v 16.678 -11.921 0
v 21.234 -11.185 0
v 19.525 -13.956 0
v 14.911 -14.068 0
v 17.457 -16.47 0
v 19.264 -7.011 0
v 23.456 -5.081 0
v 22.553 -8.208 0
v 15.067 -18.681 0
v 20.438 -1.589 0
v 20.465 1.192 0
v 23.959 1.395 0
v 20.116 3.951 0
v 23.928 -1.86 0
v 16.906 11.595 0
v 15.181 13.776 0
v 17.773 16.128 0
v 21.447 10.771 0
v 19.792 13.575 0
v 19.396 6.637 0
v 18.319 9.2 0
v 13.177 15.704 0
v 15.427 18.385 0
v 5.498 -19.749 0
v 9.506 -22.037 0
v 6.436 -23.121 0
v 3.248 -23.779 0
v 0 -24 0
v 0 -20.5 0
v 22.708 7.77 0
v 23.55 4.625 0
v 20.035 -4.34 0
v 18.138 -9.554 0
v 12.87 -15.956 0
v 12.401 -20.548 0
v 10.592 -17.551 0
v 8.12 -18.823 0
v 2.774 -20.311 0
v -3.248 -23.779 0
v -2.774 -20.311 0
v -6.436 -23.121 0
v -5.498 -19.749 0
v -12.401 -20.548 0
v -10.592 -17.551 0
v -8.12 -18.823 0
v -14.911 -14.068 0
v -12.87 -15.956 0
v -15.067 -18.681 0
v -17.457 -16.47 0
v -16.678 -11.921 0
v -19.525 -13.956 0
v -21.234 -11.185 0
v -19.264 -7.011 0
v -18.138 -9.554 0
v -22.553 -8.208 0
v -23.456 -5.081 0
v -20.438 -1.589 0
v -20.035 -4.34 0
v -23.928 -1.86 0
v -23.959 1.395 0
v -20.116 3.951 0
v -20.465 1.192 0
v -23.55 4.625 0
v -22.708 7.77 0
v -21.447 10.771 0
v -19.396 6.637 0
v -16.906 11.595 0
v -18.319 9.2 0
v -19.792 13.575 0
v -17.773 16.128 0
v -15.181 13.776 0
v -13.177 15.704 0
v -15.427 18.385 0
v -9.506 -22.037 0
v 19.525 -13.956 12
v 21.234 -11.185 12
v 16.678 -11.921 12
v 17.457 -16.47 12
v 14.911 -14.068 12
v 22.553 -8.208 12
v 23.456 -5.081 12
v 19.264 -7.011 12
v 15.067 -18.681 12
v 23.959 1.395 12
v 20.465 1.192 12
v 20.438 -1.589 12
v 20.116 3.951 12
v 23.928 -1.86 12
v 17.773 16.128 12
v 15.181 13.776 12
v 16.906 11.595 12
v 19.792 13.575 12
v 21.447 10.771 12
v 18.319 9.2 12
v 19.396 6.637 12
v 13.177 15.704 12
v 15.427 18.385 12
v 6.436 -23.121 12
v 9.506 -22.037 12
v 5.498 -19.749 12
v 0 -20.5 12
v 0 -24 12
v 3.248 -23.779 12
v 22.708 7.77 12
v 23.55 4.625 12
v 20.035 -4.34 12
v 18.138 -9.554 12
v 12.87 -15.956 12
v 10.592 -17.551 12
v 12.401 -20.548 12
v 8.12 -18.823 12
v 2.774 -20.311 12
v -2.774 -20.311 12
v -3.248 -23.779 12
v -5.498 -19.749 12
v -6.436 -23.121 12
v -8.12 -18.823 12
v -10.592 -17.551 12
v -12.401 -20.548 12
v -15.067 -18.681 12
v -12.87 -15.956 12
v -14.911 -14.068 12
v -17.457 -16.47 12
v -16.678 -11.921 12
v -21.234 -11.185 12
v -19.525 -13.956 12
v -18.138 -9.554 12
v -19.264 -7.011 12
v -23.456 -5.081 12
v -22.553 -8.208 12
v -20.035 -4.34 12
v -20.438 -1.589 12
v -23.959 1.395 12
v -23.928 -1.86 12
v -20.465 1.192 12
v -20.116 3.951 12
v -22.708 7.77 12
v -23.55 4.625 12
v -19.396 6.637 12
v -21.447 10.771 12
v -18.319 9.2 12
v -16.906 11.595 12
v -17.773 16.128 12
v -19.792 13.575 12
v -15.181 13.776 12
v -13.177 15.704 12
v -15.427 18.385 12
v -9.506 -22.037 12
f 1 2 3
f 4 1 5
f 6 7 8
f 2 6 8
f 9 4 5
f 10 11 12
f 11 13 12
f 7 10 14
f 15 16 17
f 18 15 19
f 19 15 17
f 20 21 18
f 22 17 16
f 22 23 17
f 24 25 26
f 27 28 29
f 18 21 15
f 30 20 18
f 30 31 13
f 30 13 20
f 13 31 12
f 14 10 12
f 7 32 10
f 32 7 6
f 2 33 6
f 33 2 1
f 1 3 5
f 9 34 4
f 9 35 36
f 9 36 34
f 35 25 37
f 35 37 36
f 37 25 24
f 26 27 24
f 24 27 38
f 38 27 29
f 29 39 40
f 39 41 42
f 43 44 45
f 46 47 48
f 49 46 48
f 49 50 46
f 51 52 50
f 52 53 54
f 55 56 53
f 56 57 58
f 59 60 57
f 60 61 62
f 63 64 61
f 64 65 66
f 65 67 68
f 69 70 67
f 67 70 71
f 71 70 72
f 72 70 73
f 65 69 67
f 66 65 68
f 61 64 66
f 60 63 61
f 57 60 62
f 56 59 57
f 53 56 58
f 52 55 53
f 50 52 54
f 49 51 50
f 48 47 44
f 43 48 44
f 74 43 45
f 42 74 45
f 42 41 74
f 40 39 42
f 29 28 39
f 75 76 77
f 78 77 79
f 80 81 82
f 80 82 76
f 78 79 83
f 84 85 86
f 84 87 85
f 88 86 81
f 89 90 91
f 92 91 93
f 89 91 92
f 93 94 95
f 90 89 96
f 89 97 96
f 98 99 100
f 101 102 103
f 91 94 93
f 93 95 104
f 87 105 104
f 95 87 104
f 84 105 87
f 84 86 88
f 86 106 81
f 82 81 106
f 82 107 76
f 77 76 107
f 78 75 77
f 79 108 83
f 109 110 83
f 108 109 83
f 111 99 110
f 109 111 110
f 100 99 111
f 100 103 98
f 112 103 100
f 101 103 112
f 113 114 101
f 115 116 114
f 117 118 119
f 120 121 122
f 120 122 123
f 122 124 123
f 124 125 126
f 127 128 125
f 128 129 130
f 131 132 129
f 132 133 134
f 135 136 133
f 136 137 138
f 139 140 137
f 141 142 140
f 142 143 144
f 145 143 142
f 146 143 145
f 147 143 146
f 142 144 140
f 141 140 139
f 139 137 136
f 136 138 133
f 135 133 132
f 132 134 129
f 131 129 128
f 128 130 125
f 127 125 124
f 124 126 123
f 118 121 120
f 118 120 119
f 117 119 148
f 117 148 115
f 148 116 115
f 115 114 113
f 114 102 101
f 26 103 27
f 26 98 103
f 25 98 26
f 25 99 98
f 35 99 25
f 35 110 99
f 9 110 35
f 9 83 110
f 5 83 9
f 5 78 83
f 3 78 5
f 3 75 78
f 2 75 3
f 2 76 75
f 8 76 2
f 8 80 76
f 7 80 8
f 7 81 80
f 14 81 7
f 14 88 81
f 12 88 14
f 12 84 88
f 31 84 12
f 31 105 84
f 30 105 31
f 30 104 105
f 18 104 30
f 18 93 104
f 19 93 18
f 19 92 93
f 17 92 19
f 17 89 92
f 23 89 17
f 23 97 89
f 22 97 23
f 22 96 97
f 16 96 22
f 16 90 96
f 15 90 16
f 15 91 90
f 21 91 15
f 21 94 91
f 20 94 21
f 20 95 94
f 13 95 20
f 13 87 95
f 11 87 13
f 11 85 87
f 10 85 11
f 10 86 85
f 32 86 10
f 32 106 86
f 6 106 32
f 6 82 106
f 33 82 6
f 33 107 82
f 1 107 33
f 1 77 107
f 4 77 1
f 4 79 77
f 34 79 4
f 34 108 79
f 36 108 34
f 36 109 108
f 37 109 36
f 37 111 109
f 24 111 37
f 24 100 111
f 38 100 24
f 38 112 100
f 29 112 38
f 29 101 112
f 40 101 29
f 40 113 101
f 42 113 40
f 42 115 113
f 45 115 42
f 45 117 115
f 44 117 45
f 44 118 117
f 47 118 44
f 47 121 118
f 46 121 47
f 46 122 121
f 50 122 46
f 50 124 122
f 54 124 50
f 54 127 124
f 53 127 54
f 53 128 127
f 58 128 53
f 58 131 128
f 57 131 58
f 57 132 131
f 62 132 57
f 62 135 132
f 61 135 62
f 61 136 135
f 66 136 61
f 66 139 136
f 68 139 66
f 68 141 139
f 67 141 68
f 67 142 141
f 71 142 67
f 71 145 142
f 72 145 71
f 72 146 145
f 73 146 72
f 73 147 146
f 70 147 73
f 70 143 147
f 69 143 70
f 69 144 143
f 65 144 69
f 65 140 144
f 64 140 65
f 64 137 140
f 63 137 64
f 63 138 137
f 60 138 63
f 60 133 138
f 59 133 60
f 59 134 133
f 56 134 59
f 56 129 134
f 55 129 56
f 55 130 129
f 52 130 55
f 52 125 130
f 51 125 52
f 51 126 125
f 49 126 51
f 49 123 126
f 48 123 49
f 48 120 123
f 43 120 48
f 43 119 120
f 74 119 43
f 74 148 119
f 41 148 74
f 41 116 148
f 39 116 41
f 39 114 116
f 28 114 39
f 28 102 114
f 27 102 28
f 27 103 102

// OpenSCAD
$fn = 32;

// ----------------------------------------------------------------------
// Spring clip: 48 mm outside, 3.5 mm band, 80 degree opening
// ----------------------------------------------------------------------

// --- parameters (mm) ---
outer_r = 24;             // clip outside radius
inner_r = 20.5;           // clip bore radius
band = 3.5;               // band thickness
clip_w = 12;              // clip width
opening = 80;             // opening angle

clip_profile = [[-15.427, 18.385], [-17.773, 16.128], [-19.792, 13.575], [-21.447, 10.771], [-22.708, 7.77], [-23.55, 4.625], [-23.959, 1.395], [-23.928, -1.86], [-23.456, -5.081], [-22.553, -8.208], [-21.234, -11.185], [-19.525, -13.956], [-17.457, -16.47], [-15.067, -18.681], [-12.401, -20.548], [-9.506, -22.037], [-6.436, -23.121], [-3.248, -23.779], [0, -24], [3.248, -23.779], [6.436, -23.121], [9.506, -22.037], [12.401, -20.548], [15.067, -18.681], [17.457, -16.47], [19.525, -13.956], [21.234, -11.185], [22.553, -8.208], [23.456, -5.081], [23.928, -1.86], [23.959, 1.395], [23.55, 4.625], [22.708, 7.77], [21.447, 10.771], [19.792, 13.575], [17.773, 16.128], [15.427, 18.385], [13.177, 15.704], [15.181, 13.776], [16.906, 11.595], [18.319, 9.2], [19.396, 6.637], [20.116, 3.951], [20.465, 1.192], [20.438, -1.589], [20.035, -4.34], [19.264, -7.011], [18.138, -9.554], [16.678, -11.921], [14.911, -14.068], [12.87, -15.956], [10.592, -17.551], [8.12, -18.823], [5.498, -19.749], [2.774, -20.311], [0, -20.5], [-2.774, -20.311], [-5.498, -19.749], [-8.12, -18.823], [-10.592, -17.551], [-12.87, -15.956], [-14.911, -14.068], [-16.678, -11.921], [-18.138, -9.554], [-19.264, -7.011], [-20.035, -4.34], [-20.438, -1.589], [-20.465, 1.192], [-20.116, 3.951], [-19.396, 6.637], [-18.319, 9.2], [-16.906, 11.595], [-15.181, 13.776], [-13.177, 15.704]];

difference() {
  union() {
    linear_extrude(height = clip_w) polygon(clip_profile);
  }
}
